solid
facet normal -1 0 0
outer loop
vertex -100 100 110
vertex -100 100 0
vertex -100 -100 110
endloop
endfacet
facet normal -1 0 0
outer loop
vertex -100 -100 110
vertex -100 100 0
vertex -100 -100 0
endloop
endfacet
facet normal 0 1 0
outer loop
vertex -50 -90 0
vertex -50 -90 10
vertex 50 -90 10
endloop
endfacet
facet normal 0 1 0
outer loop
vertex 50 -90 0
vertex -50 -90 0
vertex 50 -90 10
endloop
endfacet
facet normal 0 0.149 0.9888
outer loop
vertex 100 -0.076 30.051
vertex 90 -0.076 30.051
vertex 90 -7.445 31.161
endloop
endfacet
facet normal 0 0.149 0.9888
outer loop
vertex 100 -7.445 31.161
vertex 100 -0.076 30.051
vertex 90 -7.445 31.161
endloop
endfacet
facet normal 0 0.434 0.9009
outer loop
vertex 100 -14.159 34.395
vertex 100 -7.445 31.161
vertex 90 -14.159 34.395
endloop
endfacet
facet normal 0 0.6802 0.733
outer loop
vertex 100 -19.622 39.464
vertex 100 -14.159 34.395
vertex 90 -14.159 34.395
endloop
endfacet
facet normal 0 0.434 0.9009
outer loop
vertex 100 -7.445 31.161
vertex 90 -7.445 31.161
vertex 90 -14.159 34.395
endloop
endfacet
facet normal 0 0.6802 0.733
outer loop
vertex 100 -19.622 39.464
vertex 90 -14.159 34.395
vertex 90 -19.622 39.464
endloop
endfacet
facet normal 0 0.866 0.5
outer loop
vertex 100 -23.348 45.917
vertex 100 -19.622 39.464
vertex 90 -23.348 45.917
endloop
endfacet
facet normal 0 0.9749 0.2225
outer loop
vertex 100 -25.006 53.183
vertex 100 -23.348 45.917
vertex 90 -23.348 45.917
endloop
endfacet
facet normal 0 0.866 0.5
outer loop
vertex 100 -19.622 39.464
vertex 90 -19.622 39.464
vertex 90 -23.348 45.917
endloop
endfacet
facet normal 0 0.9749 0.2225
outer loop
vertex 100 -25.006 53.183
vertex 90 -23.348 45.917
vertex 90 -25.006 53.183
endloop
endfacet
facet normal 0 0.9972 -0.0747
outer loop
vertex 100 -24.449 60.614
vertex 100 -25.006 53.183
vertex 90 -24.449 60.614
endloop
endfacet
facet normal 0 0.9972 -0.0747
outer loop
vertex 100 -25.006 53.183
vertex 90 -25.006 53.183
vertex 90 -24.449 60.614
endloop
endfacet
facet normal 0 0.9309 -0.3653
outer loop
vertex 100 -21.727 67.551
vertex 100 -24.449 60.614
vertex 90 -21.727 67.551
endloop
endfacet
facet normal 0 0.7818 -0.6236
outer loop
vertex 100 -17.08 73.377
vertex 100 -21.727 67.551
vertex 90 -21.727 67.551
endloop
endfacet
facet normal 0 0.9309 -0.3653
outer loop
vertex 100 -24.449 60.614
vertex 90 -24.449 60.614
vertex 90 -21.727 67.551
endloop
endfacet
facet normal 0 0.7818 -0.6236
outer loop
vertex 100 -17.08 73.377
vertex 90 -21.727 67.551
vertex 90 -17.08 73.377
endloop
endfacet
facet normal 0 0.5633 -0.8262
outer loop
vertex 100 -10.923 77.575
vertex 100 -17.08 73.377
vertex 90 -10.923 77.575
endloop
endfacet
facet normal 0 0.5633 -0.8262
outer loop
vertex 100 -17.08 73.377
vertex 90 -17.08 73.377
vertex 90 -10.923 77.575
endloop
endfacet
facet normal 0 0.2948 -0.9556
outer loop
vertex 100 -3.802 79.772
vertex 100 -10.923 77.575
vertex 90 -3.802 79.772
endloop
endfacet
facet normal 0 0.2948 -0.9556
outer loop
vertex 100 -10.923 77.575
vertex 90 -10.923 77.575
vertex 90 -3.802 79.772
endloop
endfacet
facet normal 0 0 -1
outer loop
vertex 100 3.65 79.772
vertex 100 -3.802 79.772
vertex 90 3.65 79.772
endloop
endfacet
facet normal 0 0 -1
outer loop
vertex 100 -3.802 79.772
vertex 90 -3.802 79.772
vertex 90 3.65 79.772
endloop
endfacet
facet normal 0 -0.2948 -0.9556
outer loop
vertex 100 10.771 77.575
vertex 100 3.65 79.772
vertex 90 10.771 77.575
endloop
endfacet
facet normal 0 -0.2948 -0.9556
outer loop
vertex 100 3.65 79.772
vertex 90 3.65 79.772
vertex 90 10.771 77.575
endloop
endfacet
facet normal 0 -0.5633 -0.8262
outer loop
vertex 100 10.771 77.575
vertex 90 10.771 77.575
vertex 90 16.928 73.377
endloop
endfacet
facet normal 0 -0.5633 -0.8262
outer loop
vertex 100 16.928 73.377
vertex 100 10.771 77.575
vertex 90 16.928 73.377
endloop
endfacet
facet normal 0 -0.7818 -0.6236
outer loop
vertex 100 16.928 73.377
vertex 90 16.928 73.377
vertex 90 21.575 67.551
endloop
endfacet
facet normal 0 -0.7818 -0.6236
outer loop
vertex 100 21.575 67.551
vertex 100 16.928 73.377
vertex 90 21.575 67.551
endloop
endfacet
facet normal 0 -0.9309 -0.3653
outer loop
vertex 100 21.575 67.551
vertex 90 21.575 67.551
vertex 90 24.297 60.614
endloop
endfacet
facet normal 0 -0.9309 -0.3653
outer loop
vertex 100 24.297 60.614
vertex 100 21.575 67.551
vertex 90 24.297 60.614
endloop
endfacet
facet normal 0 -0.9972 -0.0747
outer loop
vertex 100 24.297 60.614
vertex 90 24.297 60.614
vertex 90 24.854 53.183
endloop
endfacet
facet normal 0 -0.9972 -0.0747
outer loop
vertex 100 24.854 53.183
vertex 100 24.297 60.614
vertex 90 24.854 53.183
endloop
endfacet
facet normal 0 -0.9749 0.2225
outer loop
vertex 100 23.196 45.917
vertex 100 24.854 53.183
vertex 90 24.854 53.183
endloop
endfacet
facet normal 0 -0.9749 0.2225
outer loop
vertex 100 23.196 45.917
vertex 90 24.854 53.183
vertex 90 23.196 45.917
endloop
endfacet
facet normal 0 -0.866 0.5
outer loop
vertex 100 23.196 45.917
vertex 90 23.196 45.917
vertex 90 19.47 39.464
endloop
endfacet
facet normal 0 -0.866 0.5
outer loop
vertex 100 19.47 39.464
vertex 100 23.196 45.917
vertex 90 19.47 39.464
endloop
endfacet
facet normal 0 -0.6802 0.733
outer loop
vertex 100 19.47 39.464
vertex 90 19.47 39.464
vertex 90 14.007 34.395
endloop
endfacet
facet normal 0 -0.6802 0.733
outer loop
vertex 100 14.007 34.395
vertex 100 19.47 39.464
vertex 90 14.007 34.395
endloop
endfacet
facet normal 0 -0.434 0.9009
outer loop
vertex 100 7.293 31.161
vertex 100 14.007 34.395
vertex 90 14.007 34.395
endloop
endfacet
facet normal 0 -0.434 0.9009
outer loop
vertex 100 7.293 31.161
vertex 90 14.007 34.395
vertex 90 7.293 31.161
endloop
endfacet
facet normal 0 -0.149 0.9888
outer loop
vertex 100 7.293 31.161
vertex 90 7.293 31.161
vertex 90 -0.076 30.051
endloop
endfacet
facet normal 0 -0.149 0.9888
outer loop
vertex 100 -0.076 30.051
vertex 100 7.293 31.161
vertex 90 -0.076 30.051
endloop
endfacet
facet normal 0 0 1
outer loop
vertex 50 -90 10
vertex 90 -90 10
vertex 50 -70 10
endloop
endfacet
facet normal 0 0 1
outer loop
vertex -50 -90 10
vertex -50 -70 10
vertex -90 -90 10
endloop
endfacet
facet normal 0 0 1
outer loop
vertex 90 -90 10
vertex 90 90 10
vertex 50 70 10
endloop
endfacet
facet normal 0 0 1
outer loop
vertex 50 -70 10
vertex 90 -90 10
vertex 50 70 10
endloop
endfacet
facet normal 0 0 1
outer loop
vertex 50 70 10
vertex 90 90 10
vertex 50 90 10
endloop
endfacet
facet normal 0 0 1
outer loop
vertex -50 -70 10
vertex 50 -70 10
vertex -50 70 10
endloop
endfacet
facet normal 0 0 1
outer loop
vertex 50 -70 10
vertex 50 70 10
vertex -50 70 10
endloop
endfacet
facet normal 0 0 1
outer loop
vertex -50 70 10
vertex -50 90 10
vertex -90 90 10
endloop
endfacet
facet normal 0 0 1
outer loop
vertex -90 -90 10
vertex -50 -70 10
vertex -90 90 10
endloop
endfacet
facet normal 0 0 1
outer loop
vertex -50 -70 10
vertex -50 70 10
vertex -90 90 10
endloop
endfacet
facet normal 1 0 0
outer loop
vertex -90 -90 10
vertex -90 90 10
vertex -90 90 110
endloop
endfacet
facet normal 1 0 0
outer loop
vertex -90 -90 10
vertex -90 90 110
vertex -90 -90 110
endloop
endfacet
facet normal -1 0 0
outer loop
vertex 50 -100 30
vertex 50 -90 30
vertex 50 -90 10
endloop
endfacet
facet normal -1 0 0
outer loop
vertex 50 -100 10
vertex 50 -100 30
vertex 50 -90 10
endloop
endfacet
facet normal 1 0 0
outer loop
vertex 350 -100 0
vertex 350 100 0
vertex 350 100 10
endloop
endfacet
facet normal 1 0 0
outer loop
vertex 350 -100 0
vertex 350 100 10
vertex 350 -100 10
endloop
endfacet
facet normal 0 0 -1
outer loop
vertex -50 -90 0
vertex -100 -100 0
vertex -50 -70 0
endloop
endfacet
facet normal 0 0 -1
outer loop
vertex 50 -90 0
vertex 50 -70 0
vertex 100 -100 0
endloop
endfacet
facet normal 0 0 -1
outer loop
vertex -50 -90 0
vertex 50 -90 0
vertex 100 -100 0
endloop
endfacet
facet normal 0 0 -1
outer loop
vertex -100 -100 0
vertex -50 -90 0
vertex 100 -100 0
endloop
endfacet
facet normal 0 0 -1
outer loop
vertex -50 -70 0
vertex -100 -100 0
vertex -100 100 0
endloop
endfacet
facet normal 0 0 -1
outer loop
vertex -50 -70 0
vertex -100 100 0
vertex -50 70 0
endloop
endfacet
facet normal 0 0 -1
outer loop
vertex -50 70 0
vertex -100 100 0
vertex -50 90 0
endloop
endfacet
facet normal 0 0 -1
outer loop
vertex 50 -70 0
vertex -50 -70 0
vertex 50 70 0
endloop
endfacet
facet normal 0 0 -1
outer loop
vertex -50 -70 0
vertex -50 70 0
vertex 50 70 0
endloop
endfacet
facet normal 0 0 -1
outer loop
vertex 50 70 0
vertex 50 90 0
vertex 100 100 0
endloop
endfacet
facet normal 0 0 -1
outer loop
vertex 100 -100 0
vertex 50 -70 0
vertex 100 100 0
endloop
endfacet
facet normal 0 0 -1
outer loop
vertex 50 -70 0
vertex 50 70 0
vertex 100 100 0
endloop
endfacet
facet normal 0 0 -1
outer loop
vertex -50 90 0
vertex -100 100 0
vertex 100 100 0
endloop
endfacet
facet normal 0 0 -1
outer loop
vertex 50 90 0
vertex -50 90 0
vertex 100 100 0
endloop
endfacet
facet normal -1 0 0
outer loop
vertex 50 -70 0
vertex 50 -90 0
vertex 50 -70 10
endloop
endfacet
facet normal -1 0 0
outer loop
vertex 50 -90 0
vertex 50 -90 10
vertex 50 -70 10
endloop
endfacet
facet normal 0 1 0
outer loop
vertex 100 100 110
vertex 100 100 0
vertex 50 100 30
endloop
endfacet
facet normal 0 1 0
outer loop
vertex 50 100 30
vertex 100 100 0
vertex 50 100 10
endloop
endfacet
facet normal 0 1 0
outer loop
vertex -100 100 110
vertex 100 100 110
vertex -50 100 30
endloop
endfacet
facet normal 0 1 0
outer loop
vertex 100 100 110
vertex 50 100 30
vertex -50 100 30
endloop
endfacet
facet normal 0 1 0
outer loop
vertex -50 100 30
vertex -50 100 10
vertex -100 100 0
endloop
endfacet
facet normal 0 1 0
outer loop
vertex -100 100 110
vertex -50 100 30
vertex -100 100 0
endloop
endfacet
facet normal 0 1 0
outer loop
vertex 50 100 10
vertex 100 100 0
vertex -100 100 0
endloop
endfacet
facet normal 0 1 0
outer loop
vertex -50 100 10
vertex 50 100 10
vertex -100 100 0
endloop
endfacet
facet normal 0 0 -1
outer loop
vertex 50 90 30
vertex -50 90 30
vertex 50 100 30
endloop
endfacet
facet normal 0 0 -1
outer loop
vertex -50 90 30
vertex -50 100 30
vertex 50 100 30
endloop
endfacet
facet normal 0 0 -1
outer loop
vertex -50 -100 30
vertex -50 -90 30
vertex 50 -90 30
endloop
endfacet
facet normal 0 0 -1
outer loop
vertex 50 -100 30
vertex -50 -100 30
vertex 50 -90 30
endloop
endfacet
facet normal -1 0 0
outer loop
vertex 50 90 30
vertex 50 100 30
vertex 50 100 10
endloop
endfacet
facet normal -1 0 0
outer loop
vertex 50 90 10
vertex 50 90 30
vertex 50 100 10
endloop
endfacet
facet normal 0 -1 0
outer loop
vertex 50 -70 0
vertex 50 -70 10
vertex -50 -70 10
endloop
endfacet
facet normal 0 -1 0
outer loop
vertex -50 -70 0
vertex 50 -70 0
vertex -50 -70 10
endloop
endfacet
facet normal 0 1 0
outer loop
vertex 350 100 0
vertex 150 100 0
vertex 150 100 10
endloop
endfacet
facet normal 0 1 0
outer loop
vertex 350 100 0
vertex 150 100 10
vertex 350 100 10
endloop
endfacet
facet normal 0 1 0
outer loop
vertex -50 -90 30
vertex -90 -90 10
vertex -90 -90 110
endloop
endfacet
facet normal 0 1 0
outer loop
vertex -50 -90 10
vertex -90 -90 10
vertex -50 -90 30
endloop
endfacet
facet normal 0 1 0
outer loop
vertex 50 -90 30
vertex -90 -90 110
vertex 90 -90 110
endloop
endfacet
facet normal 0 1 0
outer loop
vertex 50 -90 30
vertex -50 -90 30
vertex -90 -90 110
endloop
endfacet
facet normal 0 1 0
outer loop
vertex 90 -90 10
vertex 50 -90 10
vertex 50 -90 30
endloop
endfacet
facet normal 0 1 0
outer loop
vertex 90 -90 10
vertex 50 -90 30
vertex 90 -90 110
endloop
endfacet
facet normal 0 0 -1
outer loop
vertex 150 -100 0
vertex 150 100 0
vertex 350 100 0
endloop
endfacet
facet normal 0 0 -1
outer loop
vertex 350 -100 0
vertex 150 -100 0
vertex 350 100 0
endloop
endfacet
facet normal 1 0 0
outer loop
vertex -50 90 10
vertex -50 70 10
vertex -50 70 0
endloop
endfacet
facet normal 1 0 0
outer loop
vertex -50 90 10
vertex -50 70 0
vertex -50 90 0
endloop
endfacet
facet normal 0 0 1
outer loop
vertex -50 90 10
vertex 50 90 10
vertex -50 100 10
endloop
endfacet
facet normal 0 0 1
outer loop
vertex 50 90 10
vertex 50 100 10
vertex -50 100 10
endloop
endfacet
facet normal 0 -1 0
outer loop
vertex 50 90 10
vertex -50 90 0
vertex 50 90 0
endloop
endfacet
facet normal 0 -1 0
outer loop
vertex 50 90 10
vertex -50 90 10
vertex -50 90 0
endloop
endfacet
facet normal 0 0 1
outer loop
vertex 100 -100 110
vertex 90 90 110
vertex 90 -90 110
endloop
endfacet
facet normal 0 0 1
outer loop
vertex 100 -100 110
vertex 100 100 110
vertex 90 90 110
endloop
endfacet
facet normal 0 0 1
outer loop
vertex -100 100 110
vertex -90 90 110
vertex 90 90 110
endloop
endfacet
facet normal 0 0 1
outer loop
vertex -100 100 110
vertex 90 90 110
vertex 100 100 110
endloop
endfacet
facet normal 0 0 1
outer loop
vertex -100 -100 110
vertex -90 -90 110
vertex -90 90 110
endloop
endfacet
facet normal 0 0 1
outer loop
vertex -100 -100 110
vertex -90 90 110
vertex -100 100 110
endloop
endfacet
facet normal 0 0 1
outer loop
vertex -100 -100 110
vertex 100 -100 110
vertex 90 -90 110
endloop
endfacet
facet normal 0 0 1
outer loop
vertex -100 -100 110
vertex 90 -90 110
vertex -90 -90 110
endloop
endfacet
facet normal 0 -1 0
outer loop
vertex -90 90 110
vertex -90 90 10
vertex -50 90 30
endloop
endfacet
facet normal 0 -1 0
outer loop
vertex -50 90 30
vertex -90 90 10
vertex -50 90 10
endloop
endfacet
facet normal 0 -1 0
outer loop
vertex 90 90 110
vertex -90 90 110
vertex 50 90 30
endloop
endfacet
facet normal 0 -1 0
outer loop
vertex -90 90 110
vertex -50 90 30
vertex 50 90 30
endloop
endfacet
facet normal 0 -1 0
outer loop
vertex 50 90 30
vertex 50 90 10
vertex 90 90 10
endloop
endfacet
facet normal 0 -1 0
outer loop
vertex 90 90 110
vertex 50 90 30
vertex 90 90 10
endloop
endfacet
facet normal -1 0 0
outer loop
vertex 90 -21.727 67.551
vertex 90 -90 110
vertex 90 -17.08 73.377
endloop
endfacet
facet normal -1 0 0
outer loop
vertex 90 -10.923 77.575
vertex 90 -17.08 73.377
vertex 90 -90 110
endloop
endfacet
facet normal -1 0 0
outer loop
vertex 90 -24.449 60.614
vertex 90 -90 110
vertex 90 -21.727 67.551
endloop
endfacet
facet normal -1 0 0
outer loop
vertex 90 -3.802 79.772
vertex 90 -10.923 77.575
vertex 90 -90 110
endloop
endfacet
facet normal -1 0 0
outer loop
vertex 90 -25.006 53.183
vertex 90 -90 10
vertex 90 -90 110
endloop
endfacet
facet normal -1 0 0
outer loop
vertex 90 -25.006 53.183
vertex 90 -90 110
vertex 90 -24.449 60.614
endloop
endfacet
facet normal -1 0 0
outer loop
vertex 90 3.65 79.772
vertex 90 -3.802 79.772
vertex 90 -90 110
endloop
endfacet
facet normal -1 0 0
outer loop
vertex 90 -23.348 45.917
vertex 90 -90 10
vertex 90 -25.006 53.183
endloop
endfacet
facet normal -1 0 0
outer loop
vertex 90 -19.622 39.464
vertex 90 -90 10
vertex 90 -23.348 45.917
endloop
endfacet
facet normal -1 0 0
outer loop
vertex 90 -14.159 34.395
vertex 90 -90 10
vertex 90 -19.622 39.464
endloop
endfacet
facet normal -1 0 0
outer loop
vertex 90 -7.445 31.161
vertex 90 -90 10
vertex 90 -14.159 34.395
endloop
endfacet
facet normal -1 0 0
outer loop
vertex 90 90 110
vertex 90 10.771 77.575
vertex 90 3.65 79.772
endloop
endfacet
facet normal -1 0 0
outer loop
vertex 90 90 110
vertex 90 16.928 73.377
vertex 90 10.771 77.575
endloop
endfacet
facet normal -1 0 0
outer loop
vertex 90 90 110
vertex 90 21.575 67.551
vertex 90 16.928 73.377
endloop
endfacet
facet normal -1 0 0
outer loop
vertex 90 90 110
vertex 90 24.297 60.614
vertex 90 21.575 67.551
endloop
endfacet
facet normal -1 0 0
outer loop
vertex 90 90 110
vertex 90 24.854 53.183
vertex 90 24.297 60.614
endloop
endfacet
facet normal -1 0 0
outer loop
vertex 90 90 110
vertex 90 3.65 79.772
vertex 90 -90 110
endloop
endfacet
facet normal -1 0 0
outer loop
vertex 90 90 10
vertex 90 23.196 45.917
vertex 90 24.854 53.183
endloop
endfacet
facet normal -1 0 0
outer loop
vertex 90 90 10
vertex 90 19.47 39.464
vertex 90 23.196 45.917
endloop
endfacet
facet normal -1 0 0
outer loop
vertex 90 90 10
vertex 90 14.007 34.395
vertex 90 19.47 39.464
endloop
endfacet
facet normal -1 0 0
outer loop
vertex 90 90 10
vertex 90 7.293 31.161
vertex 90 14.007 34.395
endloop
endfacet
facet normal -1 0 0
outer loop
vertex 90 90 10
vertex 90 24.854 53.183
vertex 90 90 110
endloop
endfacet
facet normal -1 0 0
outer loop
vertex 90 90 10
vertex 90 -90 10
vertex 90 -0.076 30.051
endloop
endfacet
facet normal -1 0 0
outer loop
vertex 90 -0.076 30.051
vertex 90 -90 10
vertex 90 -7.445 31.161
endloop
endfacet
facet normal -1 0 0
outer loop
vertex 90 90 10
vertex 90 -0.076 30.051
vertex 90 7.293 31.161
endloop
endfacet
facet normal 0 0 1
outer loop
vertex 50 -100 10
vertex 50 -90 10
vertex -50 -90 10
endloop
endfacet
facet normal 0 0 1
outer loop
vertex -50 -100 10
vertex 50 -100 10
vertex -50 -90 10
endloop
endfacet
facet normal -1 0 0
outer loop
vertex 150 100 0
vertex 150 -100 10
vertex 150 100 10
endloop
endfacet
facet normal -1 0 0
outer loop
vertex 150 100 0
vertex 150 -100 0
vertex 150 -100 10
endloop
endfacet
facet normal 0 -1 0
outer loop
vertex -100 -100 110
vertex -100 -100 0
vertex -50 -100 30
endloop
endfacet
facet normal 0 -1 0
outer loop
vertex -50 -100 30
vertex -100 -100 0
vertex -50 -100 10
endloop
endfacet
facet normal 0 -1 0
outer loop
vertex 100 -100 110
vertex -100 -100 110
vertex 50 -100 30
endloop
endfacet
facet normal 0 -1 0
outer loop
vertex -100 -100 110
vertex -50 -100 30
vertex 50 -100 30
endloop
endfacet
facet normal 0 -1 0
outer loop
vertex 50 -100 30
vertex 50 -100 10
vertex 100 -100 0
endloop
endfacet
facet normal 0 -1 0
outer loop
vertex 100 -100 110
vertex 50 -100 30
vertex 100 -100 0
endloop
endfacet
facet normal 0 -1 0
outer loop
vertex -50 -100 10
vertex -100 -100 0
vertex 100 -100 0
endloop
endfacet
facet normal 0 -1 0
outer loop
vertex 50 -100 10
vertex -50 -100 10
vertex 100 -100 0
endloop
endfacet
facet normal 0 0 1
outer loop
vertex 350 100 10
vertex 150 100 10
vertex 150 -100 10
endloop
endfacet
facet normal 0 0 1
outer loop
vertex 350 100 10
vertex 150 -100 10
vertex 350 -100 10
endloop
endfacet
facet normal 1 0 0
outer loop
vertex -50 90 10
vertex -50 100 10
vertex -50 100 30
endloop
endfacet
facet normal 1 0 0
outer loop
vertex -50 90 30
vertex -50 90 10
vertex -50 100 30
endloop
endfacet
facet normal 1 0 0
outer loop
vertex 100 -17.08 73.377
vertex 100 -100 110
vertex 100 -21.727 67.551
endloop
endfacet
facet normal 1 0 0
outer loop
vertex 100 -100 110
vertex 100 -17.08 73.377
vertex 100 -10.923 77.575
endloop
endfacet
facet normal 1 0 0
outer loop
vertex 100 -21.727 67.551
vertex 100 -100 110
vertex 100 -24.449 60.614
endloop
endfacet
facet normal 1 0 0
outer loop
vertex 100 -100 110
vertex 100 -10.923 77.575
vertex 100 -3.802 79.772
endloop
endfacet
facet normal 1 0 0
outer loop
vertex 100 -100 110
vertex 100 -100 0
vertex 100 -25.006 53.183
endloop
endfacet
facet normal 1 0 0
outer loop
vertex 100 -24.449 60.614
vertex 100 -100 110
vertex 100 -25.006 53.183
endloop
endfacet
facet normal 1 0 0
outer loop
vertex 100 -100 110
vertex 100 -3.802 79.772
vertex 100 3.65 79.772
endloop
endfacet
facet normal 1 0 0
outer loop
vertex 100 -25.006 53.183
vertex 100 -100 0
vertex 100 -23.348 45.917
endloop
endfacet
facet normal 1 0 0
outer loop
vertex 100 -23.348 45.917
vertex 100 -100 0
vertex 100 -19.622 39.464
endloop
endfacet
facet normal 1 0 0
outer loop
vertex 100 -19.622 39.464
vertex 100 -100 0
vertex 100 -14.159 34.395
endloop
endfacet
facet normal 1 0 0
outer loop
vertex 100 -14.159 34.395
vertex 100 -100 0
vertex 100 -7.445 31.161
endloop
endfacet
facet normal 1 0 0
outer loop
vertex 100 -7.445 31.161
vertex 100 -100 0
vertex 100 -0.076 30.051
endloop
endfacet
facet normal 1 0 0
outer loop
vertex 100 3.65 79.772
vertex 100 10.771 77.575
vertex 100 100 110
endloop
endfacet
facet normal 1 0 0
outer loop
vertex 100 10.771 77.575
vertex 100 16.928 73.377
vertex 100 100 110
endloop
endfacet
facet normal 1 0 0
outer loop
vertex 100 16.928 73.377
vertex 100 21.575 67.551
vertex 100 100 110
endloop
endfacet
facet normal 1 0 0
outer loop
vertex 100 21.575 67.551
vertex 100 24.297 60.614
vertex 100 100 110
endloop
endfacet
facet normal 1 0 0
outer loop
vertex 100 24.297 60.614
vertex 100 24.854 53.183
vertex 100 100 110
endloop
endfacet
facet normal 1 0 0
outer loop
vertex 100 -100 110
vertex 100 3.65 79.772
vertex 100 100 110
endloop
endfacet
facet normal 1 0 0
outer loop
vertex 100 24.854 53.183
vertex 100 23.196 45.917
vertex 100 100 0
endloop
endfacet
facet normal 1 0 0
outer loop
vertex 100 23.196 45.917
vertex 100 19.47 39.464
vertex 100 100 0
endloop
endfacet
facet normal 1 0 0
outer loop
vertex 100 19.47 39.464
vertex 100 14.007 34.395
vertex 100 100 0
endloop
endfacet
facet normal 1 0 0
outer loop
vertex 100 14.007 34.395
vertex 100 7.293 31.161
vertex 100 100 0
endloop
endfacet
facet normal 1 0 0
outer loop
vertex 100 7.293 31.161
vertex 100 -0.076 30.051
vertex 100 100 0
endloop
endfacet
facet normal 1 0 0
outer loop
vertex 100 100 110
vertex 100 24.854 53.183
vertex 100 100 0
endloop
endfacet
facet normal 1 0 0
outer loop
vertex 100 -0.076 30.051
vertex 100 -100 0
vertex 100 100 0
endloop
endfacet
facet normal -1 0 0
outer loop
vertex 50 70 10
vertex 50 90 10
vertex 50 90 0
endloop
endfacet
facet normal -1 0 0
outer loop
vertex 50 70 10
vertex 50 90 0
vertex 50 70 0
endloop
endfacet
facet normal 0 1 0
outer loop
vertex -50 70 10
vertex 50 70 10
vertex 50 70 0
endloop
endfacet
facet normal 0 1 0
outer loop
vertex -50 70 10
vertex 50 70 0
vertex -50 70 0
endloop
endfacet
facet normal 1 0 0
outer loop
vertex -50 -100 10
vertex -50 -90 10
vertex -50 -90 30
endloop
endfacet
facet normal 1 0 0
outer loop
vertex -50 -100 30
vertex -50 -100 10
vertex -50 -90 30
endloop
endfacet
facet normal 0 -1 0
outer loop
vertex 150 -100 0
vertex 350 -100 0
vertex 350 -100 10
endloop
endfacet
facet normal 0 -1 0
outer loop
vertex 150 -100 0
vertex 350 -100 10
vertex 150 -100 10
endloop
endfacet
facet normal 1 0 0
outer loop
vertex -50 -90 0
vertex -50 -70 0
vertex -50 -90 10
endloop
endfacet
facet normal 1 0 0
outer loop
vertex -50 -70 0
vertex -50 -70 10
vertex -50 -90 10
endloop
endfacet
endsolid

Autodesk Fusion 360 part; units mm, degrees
sketch "Boceto1" plane through (0, 0, 0) normal (0, 0, 1) x (1, 0, 0)
  line L0 (100, 100) -> (-100, 100)
  line L1 (-100, 100) -> (-100, -100)
  line L2 (-100, -100) -> (100, -100)
  line L3 (100, -100) -> (100, 100)
  line L4 (100, 100) -> (-100, -100) construction
  line L5 (-100, 100) -> (100, -100) construction
  dimension "L_base" = 200
extrude "Extruir1" add sketch "Boceto1" along normal blind 10 makes body 1
sketch "Boceto2" plane through (0, 0, 10) normal (0, 0, 1) x (-1, 0, 0)
  line L0 (-100, 100) -> (-100, -100)
  line L1 (-100, -100) -> (100, -100)
  line L2 (100, -100) -> (100, 100)
  line L3 (100, 100) -> (-100, 100)
  line L4 (100, -100) -> (90, -100)
  line L5 (90, -100) -> (90, 100)
  line L6 (90, 100) -> (100, 100)
  line L7 (100, 100) -> (100, -100)
  line L8 (90, -90) -> (-100, -90)
  line L9 (-100, -90) -> (-100, -100)
  line L10 (-100, -100) -> (90, -100)
  line L11 (90, -100) -> (90, -90)
  line L12 (-90, -90) -> (-100, -90)
  line L13 (-100, -90) -> (-100, 100)
  line L14 (-100, 100) -> (-90, 100)
  line L15 (-90, 100) -> (-90, -90)
  line L16 (-90, 100) -> (90, 100)
  line L17 (90, 100) -> (90, 90)
  line L18 (90, 90) -> (-90, 90)
  line L19 (-90, 90) -> (-90, 100)
  dimension "d4" = 10
  dimension "d5" = 10
  dimension "d6" = 10
  dimension "d7" = 10
extrude "Extruir2" add sketch "Boceto2" along normal blind 100 contours L0 L3 L8 L12 L13 L14 L15 L19 | L0 L1 L5 L8 L9 L10 L11 L12 | L3 L5 L15 L16 L17 L18 L19 | L1 L2 L3 L4 L5 L6 L7 L11 L17 bodies 1
sketch "Boceto4" plane through (100, 0, 0) normal (1, 0, 0) x (0, 1, 0)
  line L0 (-100, 0) -> (100, 0)
  line L1 (100, 0) -> (100, 110)
  line L2 (100, 110) -> (-100, 110)
  line L3 (-100, 110) -> (-100, 0)
hole "Agujero1" at (100, -0.0759, 55.0508) direction (-1, 0, 0) diameter 50 depth 10 tip angle 118 bodies 1
sketch "Boceto5" plane through (0, 0, 0) normal (0, 0, 1) x (1, 0, 0)
  line L0 (150, 100) -> (350, 100)
  line L1 (350, 100) -> (350, -100)
  line L2 (350, -100) -> (150, -100)
  line L3 (150, -100) -> (150, 100)
  line L4 (150, 100) -> (350, -100) construction
  line L5 (350, 100) -> (150, -100) construction
  line L6 (100, 100) -> (-100, 100)
  point P0 (250, 0)
  dimension "d13" = 250
  dimension "d14" = 200
extrude "Extruir3" add sketch "Boceto5" along normal blind 10 separate body makes body 2
sketch "Boceto6" plane through (0, -100, 0) normal (0, -1, 0) x (1, 0, 0)
  line L0 (-100, 0) -> (100, 0)
  line L1 (100, 0) -> (100, 110)
  line L2 (100, 110) -> (-100, 110)
  line L3 (-100, 110) -> (-100, 0)
  line L4 (0, 0) -> (0, 10)
  line L5 (50, 10) -> (-50, 10)
  line L6 (-50, 10) -> (-50, 30)
  line L7 (-50, 30) -> (50, 30)
  line L8 (50, 30) -> (50, 10)
  line L9 (50, 10) -> (-50, 30) construction
  line L10 (-50, 10) -> (50, 30) construction
  point P0 (0, 20)
  dimension "d17" = 10
  dimension "d18" = 20
  dimension "d19" = 100
extrude "Extruir4" cut sketch "Boceto6" along normal through all and the other way through all contours L5 L6 L7 L8 bodies 1
sketch "Boceto7" plane through (0, 0, 10) normal (0, 0, 1) x (-1, 0, 0)
  line L0 (50, -90) -> (90, -90)
  line L1 (90, -90) -> (90, 90)
  line L2 (90, 90) -> (50, 90)
  line L3 (50, 90) -> (50, 100)
  line L4 (50, 100) -> (-50, 100)
  line L5 (-50, 100) -> (-50, 90)
  line L6 (-50, 90) -> (-90, 90)
  line L7 (-90, 90) -> (-90, -90)
  line L8 (-90, -90) -> (-50, -90)
  line L9 (-50, -90) -> (-50, -100)
  line L10 (-50, -100) -> (50, -100)
  line L11 (50, -100) -> (50, -90)
  line L12 (50, -90) -> (-50, -90)
  line L13 (-50, -90) -> (-50, -70)
  line L14 (-50, -70) -> (50, -70)
  line L15 (50, -70) -> (50, -90)
  line L16 (50, 90) -> (-50, 90)
  line L17 (-50, 90) -> (-50, 70)
  line L18 (-50, 70) -> (50, 70)
  line L19 (50, 70) -> (50, 90)
  point P0 (50, -90)
  point P1 (-50, -90)
  point P2 (50, 90)
  point P3 (-50, 90)
  dimension "d21" = 100
  dimension "d22" = 20
extrude "Extruir5" cut sketch "Boceto7" against normal up to surface (10 mm away) contours L12 L13 L14 L15 | L16 L17 L18 L19 bodies 1
